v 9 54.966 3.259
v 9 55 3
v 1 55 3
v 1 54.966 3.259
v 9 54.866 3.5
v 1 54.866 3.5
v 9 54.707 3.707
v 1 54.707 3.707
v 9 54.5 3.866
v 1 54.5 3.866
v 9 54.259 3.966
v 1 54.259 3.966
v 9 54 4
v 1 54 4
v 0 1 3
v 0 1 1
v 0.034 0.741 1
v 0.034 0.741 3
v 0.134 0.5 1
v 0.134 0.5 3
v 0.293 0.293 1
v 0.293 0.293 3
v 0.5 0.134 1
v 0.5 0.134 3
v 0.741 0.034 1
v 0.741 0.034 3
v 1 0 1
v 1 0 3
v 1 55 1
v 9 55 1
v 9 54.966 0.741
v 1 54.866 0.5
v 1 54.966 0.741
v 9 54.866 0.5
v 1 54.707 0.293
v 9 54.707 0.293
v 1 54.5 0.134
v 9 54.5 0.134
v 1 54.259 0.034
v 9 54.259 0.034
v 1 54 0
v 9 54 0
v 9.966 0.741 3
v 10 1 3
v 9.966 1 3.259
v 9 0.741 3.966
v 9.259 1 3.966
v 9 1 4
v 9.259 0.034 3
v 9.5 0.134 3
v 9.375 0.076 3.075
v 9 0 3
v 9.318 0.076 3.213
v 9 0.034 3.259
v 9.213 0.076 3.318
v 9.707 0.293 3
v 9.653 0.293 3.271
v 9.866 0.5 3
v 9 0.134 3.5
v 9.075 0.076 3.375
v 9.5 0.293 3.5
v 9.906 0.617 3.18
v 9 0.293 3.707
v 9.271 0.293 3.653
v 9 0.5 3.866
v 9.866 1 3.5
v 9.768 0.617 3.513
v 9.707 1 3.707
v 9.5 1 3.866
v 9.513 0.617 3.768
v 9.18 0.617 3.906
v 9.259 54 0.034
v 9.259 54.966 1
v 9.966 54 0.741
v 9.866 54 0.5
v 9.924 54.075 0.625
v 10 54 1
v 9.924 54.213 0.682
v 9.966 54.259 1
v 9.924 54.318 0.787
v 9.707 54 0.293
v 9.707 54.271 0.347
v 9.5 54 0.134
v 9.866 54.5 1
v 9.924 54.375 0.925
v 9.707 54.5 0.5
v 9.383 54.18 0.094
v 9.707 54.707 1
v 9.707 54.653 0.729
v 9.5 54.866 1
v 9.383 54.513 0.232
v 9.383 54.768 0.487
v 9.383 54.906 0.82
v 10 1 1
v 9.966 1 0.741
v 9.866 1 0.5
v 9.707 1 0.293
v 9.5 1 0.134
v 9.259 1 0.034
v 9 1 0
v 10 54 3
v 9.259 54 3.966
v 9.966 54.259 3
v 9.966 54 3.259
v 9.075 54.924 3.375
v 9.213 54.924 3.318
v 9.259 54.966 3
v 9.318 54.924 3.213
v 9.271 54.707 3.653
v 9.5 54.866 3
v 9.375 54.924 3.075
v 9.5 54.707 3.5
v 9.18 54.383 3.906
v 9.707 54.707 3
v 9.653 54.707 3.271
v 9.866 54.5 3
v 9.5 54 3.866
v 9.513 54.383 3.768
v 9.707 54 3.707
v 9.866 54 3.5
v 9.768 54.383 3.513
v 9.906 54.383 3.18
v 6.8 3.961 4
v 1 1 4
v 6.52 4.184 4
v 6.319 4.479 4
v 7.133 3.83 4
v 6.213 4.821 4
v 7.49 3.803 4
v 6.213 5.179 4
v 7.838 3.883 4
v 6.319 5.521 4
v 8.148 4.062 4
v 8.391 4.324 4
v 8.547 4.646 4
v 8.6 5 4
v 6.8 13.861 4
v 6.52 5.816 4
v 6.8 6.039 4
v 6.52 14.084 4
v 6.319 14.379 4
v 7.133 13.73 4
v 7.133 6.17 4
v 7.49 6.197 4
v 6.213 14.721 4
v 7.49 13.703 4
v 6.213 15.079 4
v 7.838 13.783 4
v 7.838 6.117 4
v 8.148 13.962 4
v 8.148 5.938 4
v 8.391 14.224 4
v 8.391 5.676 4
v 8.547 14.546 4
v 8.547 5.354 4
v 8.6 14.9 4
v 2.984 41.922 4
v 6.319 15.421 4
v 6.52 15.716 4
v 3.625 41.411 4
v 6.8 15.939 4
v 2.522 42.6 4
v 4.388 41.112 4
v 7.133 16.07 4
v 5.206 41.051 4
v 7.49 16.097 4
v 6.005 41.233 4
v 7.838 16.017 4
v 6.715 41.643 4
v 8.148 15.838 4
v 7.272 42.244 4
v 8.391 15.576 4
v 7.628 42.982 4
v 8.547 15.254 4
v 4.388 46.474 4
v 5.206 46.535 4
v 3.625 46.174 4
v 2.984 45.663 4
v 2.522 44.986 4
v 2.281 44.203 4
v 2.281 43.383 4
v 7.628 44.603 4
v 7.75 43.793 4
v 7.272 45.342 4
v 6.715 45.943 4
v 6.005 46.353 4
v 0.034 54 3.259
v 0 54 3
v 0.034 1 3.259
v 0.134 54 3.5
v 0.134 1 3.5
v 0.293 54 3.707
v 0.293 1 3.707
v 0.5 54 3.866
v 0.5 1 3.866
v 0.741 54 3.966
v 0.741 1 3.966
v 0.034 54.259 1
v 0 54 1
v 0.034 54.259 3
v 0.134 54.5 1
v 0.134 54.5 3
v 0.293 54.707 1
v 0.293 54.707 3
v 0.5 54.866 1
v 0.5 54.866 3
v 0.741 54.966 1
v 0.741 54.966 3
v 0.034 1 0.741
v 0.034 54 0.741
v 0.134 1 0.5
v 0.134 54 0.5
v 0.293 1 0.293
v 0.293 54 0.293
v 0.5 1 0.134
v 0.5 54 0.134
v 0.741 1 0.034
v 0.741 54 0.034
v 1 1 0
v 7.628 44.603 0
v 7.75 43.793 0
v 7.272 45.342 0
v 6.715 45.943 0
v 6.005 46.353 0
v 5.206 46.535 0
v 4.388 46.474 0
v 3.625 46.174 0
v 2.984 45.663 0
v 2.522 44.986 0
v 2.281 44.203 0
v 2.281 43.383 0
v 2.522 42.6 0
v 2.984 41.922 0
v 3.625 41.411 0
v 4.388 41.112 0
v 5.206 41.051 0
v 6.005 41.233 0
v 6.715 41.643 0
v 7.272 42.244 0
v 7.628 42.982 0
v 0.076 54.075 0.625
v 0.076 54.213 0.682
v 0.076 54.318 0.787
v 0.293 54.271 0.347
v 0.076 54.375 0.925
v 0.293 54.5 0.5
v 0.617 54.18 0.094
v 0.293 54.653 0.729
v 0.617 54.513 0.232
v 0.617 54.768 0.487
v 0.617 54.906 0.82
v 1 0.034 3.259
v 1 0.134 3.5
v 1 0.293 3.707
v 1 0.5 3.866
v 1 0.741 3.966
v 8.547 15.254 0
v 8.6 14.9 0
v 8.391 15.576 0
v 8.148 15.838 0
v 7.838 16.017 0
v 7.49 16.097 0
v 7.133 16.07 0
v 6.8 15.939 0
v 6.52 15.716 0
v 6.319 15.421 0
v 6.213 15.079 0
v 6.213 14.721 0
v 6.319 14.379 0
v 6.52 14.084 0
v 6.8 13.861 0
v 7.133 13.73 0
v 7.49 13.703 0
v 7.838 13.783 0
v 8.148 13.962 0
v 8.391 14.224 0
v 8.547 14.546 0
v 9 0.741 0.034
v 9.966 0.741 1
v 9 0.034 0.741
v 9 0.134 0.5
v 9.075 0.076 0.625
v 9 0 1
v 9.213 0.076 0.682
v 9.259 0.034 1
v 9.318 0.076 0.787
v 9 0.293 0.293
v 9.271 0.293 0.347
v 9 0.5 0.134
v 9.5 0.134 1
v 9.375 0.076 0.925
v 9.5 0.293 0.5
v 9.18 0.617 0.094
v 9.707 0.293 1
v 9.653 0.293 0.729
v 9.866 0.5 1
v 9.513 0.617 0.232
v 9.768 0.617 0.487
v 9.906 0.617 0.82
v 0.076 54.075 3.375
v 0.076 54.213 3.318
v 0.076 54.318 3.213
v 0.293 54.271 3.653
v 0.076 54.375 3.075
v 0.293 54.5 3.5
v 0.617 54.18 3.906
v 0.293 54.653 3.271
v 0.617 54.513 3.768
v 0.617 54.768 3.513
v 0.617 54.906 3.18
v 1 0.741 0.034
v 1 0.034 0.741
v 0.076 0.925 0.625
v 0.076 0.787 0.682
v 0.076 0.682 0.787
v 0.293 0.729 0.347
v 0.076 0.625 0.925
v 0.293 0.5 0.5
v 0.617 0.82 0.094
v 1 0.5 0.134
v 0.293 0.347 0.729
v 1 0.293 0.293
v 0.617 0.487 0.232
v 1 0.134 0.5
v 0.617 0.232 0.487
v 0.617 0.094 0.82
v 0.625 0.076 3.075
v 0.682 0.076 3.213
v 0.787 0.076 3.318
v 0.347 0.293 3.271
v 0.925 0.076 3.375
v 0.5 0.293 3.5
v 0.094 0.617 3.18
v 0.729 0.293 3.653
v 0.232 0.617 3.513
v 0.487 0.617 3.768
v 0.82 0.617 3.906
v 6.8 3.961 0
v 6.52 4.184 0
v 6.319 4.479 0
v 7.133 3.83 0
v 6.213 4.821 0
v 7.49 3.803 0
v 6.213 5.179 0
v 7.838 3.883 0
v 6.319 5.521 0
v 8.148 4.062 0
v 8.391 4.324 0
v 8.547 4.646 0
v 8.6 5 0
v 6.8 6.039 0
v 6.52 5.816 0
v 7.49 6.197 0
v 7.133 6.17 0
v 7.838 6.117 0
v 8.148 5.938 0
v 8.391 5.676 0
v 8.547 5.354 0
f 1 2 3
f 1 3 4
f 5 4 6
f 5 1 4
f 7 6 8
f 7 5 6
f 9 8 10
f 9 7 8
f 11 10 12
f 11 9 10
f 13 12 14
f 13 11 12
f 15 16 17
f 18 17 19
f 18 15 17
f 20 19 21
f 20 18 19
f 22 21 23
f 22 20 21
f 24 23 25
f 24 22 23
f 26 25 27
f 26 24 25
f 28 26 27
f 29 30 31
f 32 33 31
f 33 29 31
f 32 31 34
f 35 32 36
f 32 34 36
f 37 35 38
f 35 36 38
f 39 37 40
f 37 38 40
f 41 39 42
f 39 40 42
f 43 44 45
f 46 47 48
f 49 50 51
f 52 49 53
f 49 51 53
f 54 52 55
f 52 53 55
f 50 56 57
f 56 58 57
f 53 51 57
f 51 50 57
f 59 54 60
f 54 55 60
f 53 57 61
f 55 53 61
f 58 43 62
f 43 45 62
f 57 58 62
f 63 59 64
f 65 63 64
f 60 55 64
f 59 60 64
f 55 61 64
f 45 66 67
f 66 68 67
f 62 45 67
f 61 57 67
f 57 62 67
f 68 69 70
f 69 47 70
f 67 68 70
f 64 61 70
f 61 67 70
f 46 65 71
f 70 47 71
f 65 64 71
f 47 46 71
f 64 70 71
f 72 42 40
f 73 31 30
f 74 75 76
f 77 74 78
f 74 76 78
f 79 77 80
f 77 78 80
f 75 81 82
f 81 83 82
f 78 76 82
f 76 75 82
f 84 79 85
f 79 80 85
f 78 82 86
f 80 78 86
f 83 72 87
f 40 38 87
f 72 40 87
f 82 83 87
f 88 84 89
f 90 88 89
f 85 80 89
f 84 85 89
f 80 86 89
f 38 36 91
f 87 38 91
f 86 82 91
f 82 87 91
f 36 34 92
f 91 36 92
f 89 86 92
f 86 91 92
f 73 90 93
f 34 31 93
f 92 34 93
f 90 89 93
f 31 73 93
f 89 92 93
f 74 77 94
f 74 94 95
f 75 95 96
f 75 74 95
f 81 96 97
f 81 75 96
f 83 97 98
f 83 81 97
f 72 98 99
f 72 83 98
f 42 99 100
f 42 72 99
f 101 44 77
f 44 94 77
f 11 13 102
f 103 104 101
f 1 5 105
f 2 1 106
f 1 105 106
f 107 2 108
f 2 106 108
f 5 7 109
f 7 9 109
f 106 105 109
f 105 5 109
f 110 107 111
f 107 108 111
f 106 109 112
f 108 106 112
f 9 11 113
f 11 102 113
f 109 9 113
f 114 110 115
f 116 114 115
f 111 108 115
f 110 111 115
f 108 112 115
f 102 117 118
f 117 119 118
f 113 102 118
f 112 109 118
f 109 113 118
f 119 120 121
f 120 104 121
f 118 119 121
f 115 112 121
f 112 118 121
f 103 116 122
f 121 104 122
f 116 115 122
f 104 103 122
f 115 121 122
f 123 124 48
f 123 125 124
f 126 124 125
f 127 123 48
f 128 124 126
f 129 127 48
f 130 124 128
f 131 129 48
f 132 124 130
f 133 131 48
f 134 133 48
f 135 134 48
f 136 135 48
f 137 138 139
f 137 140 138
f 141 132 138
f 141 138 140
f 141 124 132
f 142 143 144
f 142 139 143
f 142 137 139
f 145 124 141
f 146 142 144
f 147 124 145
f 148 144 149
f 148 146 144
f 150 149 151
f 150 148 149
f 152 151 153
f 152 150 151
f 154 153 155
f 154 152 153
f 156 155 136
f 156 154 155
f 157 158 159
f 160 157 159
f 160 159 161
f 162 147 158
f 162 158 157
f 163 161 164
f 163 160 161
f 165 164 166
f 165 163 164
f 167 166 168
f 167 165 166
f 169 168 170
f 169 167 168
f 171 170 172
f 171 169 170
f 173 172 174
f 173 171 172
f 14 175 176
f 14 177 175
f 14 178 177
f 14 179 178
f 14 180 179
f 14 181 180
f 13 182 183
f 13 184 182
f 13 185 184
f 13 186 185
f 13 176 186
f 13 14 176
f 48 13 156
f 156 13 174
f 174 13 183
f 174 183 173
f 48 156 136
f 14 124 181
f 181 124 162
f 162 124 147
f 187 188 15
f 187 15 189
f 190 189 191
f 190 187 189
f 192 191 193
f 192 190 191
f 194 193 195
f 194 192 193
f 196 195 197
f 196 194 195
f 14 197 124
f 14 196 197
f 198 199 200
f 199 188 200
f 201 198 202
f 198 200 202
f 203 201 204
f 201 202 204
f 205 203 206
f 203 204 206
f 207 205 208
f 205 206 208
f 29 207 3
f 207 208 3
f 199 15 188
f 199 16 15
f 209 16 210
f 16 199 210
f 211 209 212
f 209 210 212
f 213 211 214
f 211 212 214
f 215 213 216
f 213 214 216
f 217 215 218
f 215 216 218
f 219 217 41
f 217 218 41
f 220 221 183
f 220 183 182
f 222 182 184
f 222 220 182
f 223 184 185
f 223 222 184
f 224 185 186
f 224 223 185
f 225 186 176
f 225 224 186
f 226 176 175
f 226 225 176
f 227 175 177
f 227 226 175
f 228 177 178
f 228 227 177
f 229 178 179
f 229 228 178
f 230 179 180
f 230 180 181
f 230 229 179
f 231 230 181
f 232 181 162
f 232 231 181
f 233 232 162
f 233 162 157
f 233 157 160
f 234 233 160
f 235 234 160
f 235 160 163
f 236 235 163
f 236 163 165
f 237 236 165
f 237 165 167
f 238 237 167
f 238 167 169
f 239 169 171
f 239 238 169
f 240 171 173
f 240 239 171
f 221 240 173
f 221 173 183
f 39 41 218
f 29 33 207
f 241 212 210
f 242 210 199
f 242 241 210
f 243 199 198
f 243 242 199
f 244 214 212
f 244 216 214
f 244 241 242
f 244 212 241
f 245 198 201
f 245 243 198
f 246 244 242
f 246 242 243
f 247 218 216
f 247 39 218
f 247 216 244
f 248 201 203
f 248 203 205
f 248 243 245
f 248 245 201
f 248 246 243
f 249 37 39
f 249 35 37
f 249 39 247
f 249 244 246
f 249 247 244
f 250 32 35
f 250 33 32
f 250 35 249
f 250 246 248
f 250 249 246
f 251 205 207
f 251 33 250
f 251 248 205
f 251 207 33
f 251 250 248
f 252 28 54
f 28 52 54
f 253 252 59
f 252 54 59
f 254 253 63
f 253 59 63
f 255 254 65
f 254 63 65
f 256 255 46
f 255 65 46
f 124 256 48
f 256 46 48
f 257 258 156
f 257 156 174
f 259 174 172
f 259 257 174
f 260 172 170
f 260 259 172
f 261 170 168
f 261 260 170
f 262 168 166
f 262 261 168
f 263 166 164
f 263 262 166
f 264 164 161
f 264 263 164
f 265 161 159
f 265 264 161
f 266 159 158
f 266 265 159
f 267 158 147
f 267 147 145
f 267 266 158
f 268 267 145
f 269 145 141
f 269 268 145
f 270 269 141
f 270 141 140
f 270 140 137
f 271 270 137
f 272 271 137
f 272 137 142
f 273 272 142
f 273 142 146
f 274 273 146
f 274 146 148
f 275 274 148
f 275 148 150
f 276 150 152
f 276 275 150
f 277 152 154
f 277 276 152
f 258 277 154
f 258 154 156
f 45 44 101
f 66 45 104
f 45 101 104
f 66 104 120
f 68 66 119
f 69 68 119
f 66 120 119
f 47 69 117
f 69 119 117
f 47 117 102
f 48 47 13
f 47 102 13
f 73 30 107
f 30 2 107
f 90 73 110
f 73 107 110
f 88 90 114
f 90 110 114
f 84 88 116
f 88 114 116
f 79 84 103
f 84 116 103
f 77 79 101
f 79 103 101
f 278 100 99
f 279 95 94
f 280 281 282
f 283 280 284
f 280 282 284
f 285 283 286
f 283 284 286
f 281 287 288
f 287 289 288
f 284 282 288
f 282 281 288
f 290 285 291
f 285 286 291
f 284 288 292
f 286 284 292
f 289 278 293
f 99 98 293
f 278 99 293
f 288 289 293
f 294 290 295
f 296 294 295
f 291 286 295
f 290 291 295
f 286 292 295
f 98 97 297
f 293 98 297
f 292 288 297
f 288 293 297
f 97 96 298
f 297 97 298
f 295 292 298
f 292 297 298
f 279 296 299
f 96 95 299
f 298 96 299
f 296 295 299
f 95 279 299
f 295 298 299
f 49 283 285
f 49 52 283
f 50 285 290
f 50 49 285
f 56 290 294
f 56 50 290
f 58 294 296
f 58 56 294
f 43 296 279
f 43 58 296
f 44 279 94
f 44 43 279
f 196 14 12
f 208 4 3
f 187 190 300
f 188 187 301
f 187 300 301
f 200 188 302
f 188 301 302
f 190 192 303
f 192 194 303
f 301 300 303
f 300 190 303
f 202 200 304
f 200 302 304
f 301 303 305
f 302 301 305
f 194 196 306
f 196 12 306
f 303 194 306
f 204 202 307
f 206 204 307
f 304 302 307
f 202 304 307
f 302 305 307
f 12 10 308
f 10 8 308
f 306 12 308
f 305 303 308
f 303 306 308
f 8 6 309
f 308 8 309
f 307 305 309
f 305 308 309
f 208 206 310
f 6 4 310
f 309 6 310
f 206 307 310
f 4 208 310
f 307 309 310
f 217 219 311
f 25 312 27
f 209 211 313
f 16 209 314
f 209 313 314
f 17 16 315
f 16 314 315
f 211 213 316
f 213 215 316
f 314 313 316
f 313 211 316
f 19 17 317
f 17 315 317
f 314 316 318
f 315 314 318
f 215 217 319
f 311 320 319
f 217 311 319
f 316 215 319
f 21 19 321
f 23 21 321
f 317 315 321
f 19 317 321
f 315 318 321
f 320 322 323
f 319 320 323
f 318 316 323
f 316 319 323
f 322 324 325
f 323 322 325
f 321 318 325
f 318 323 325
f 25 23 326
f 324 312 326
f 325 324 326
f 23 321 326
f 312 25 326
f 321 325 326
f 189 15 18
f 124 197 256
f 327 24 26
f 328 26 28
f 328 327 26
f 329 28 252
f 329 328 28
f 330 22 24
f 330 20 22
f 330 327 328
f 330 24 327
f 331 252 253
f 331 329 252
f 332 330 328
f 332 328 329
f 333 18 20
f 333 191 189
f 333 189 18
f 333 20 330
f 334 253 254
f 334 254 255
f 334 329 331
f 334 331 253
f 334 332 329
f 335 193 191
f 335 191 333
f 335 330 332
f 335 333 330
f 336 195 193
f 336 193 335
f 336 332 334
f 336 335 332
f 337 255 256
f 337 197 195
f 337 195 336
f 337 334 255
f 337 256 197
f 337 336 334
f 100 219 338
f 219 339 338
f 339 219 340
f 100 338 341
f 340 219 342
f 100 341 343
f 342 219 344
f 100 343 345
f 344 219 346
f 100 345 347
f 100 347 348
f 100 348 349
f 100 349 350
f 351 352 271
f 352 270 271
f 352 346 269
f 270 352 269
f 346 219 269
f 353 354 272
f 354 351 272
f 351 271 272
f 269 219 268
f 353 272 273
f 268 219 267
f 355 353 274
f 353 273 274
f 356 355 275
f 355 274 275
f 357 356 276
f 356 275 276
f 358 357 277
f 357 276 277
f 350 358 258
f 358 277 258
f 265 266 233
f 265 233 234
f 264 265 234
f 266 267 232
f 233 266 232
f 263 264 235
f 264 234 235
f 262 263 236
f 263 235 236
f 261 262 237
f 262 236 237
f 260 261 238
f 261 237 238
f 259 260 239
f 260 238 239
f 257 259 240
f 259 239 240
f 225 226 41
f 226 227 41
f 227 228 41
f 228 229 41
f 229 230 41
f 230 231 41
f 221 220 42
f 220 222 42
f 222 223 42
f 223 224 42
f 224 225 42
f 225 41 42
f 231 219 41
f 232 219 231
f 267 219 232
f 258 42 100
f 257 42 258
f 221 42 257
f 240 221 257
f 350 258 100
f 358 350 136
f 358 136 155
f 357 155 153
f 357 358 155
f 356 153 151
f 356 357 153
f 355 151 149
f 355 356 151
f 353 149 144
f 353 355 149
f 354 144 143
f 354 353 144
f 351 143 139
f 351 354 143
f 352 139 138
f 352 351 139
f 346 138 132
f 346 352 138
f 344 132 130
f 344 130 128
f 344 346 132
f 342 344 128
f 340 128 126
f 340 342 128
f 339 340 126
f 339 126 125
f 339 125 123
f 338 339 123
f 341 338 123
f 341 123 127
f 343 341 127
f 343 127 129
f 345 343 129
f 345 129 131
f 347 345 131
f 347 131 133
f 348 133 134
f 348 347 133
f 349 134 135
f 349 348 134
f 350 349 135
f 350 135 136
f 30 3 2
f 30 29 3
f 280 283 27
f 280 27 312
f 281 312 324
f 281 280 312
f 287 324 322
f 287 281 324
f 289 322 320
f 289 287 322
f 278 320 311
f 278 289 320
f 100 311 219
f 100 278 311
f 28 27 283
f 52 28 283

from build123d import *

# Parameters (mm, degrees)
SKETCH1_W           = 10
SKETCH1_H           = 55
SKETCH1_R           = 1.2
SKETCH1_R_2         = 2.75
BOSS_EXTRUDE1_DEPTH = 4
FILLET1_R           = 1


with BuildPart() as part:
    # Sketch1 → Boss-Extrude1 (new body)
    with BuildSketch(Plane.XY):
        with Locations((5, 27.5)):
            Rectangle(SKETCH1_W, SKETCH1_H)
        with Locations((7.4, 5)):
            Circle(SKETCH1_R, mode=Mode.SUBTRACT)
        with Locations((7.4, 14.9)):
            Circle(SKETCH1_R, mode=Mode.SUBTRACT)
        with Locations((5, 43.792878619)):
            Circle(SKETCH1_R_2, mode=Mode.SUBTRACT)
    extrude(amount=BOSS_EXTRUDE1_DEPTH)

    # Fillet1
    fillet1_edges = [part.edges().sort_by_distance(p)[0] for p in [
        (10, 27.5, 4),
        (5, 55, 4),
        (0, 27.5, 4),
        (5, 55, 0),
        (10, 27.5, 0),
        (5, 0, 0),
        (0, 27.5, 0),
        (0, 55, 2),
        (10, 55, 2),
        (10, 0, 2),
        (0, 0, 2),
        (5, 0, 4),
    ]]
    fillet(fillet1_edges, radius=FILLET1_R)


solid = part.part
